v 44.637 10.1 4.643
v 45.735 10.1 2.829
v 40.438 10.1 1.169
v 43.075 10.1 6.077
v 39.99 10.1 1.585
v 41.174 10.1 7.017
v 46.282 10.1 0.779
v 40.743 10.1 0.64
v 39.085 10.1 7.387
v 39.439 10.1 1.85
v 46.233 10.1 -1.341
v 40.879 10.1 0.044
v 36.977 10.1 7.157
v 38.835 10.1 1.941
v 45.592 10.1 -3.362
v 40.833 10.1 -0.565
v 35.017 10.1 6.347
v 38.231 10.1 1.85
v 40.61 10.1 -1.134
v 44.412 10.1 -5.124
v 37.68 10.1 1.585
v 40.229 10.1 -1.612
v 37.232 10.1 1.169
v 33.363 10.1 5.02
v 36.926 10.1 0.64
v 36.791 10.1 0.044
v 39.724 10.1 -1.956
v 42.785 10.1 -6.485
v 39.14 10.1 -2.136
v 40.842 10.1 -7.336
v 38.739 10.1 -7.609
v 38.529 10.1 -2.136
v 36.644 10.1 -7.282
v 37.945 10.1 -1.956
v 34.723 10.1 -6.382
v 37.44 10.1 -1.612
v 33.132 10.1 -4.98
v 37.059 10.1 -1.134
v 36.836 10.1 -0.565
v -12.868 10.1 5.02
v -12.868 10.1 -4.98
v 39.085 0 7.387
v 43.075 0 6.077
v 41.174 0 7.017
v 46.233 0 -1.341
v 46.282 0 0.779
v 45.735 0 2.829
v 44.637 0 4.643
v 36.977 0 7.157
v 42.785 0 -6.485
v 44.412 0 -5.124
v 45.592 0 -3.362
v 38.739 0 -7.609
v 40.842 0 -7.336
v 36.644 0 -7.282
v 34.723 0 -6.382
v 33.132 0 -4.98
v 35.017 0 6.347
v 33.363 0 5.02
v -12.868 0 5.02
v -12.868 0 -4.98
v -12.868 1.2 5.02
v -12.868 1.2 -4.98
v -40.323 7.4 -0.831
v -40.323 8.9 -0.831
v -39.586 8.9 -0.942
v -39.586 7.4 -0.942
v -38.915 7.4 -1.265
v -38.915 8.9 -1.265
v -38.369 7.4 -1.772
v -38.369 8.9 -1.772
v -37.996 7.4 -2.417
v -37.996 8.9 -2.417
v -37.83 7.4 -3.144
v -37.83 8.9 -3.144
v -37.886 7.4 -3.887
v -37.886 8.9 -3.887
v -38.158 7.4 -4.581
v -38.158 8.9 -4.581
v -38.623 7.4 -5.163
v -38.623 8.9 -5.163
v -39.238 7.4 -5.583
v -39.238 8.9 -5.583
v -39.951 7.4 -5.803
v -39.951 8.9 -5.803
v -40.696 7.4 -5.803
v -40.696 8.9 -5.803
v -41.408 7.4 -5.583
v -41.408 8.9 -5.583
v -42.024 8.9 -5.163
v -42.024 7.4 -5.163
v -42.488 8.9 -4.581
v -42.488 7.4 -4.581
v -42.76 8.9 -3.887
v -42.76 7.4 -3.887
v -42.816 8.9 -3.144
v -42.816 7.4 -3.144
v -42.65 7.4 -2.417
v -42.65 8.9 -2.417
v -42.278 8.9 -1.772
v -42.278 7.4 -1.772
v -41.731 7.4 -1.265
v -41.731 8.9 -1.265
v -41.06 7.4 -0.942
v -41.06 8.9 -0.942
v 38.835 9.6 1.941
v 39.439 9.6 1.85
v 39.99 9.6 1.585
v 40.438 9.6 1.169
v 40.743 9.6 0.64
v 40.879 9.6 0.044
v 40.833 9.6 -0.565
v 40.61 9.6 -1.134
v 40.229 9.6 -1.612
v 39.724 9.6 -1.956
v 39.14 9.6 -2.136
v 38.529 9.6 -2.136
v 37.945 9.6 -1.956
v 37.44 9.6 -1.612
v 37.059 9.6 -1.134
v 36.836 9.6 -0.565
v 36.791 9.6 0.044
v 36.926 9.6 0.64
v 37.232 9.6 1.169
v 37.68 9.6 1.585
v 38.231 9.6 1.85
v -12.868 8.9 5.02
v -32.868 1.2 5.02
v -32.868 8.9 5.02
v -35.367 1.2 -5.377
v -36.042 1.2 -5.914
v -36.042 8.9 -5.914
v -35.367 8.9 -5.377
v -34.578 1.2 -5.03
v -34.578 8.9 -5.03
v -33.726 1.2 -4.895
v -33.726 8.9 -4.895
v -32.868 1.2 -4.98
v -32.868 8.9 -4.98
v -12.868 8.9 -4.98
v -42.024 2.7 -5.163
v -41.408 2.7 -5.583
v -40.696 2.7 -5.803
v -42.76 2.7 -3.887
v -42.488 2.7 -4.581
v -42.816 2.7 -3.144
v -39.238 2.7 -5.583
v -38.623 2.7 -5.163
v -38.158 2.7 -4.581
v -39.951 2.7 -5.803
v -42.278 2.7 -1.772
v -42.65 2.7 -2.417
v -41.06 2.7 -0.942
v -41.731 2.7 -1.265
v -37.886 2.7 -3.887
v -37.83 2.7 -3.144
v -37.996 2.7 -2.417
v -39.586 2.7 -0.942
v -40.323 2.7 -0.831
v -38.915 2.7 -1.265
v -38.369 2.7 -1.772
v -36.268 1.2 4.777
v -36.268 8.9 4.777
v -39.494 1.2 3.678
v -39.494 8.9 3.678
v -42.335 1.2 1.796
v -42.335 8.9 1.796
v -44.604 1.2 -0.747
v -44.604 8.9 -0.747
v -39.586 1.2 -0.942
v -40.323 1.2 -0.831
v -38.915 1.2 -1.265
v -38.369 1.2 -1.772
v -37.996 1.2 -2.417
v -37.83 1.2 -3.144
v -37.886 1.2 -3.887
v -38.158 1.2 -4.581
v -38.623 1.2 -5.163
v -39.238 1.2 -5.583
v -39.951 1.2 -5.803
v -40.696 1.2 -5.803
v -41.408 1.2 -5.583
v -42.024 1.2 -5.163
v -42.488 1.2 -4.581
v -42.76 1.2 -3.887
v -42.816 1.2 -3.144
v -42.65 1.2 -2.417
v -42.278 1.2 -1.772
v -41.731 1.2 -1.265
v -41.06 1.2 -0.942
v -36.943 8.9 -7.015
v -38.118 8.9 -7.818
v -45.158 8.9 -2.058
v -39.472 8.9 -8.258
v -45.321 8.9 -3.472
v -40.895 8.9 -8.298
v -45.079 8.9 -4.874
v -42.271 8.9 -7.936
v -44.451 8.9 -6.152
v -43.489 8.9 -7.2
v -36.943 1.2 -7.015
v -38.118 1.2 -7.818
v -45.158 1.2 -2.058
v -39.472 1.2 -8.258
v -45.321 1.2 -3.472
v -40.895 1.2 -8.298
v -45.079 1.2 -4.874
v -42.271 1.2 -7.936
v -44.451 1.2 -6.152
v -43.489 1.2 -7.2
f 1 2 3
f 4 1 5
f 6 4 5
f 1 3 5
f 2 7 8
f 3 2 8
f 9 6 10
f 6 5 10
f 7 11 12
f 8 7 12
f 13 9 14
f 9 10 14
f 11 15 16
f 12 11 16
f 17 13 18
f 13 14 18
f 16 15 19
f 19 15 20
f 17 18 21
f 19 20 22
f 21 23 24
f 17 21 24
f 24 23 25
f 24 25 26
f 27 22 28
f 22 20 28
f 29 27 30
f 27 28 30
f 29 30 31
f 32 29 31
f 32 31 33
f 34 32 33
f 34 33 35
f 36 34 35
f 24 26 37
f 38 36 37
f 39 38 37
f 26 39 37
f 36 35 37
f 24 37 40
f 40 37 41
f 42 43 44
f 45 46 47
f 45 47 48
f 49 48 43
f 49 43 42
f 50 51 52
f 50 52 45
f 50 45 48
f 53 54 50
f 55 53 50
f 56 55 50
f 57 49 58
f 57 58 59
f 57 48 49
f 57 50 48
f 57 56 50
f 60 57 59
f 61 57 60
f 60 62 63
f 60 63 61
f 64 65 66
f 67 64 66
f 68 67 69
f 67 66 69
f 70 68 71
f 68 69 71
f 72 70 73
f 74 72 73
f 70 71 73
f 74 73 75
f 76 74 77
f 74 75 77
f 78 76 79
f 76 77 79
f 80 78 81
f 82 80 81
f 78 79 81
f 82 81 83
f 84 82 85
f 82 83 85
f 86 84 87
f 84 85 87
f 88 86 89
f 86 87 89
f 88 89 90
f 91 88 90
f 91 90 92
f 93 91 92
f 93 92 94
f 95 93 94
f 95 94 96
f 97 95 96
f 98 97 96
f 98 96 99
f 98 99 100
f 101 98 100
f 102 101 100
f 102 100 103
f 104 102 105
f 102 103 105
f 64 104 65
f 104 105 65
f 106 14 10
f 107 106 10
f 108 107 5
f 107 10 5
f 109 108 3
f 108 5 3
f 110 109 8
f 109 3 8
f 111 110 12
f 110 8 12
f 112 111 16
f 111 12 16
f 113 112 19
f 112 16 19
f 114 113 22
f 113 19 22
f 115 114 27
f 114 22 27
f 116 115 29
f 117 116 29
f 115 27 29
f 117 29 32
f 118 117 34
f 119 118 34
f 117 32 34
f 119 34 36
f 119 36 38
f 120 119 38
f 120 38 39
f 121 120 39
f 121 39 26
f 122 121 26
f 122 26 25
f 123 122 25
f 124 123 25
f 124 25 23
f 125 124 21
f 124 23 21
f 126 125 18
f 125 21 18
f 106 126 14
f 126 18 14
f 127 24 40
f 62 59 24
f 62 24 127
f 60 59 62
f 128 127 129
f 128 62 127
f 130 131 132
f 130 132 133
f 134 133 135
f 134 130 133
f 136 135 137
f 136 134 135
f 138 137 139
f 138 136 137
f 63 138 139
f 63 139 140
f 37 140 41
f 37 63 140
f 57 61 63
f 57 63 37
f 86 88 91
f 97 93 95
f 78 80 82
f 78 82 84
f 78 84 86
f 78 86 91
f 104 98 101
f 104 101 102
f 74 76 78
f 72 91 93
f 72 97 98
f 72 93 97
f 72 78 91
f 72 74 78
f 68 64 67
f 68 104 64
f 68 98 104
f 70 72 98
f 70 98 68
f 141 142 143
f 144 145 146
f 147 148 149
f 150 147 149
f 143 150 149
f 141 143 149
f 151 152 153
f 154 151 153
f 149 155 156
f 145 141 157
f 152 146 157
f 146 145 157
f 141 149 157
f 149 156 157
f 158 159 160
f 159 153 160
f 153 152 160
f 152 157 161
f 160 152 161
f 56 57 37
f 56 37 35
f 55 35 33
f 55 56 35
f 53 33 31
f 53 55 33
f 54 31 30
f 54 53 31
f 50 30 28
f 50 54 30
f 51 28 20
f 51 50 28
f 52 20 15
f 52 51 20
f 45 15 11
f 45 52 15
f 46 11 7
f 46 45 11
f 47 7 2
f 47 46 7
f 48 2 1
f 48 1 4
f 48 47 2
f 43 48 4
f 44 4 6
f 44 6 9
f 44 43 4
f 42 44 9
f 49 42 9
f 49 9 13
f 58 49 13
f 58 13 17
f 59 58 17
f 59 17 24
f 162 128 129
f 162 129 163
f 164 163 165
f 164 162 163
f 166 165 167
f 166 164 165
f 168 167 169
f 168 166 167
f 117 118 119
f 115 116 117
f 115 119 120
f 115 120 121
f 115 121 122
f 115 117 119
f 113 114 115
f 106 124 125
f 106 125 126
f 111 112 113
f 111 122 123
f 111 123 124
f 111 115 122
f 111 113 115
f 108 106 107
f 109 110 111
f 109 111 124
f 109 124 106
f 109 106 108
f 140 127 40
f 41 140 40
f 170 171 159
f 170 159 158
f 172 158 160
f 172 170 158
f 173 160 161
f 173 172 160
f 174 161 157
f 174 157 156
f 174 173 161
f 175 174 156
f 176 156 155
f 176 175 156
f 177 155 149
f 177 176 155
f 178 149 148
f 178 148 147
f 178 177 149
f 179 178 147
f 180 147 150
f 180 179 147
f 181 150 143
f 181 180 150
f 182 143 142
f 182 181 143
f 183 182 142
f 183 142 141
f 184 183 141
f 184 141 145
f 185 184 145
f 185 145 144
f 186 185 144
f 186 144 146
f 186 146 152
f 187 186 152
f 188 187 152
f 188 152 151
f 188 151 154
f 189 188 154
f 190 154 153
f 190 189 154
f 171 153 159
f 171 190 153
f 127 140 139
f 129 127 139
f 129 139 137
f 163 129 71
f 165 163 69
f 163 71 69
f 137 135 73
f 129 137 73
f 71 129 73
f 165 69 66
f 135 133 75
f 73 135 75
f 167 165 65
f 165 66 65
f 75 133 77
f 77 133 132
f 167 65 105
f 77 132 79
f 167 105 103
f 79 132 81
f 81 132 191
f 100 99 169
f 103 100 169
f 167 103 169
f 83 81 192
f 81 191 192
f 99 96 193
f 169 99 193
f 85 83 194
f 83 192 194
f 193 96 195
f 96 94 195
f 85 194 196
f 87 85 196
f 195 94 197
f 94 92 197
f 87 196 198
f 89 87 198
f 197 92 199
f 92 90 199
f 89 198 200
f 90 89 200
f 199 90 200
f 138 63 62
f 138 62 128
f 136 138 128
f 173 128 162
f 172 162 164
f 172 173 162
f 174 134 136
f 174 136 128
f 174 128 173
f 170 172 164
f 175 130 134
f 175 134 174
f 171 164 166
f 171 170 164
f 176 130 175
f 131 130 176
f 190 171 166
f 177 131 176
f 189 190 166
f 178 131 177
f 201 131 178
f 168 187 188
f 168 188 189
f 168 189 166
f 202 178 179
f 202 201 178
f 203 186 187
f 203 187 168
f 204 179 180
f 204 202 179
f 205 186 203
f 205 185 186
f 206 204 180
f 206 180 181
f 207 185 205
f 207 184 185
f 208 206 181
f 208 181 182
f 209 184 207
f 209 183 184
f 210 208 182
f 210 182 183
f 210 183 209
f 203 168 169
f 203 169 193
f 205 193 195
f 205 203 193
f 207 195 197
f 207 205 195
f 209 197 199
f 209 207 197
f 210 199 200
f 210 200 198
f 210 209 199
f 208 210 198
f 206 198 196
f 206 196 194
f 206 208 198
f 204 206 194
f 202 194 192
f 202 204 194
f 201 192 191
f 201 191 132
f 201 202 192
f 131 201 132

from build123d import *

# Parameters (mm, degrees)
SALIENTE_EXTRUIR1_DEPTH = 10.1
CROQUIS4_W              = 20
CROQUIS4_H              = 1.2
CORTAR_EXTRUIR1_DEPTH   = 10
SALIENTE_EXTRUIR2_START = -7.7
SALIENTE_EXTRUIR2_DEPTH = 7.7
CROQUIS6_R              = 2.5
CORTAR_EXTRUIR2_DEPTH   = 1.5
CROQUIS7_R              = 2.05
CORTAR_EXTRUIR3_DEPTH   = 0.5


with BuildPart() as part:
    # Croquis3 → Saliente-Extruir1 (new body)
    with BuildSketch(Plane(origin=(0, 0, 0), x_dir=(1, 0, 0), z_dir=(0, 1, 0))):
        with BuildLine():
            Line((33.362812396, -5.019964628), (-32.868233457, -5.019964628))
            Line((-32.868233457, -5.019964628), (-32.868233457, 4.980035372))
            Line((-32.868233457, 4.980035372), (33.131766543, 4.980035372))
            ThreePointArc((33.131766543, 4.980035372), (46.332773431, 0.282370053), (33.362812396, -5.019964628))
        make_face()
    extrude(amount=SALIENTE_EXTRUIR1_DEPTH)

    # Croquis4 → Cortar-Extruir1 (cut)
    with BuildSketch(Plane.XY.offset(5.019964628)):
        with Locations((-22.868233457, 9.5)):
            Rectangle(CROQUIS4_W, CROQUIS4_H)
    cortar_extruir1 = extrude(amount=-CORTAR_EXTRUIR1_DEPTH, mode=Mode.SUBTRACT)

    # Simetría1: Cortar-Extruir1 across plane
    add(cortar_extruir1.mirror(Plane.ZX.offset(5.05)), mode=Mode.SUBTRACT)

    # Croquis5 → Saliente-Extruir2 (add)
    with BuildSketch(Plane(origin=(0, 8.9, 0), x_dir=(1, 0, 0), z_dir=(0, 1, 0)).offset(SALIENTE_EXTRUIR2_START)):
        with BuildLine():
            Line((-32.868233457, 4.980035372), (-32.868233457, -5.019964628))
            ThreePointArc((-32.868233457, -5.019964628), (-39.493870843, -3.678231071), (-44.60405989, 0.747295745))
            ThreePointArc((-44.60405989, 0.747295745), (-42.906522418, 7.611577683), (-36.04224048, 5.914040211))
            ThreePointArc((-36.04224048, 5.914040211), (-34.577950006, 5.030024916), (-32.868233457, 4.980035372))
        make_face()
    extrude(amount=SALIENTE_EXTRUIR2_DEPTH)

    # Croquis6 → Cortar-Extruir2 (cut)
    with BuildSketch(Plane(origin=(0, 8.9, 0), x_dir=(1, 0, 0), z_dir=(0, 1, 0))):
        with Locations(Location((-40.323150185, 3.330667978, 0), (0, 0, 270))):
            Circle(CROQUIS6_R)
    cortar_extruir2 = extrude(amount=-CORTAR_EXTRUIR2_DEPTH, mode=Mode.SUBTRACT)

    # Simetría2: Cortar-Extruir2 across plane
    add(cortar_extruir2.mirror(Plane.ZX.offset(5.05)), mode=Mode.SUBTRACT)

    # Croquis7 → Cortar-Extruir3 (cut)
    with BuildSketch(Plane(origin=(0, 10.1, 0), x_dir=(1, 0, 0), z_dir=(0, 1, 0))):
        with Locations(Location((38.834774462, 0.109131896, 0), (0, 0, 270))):
            Circle(CROQUIS7_R)
    extrude(amount=-CORTAR_EXTRUIR3_DEPTH, mode=Mode.SUBTRACT)


solid = part.part
